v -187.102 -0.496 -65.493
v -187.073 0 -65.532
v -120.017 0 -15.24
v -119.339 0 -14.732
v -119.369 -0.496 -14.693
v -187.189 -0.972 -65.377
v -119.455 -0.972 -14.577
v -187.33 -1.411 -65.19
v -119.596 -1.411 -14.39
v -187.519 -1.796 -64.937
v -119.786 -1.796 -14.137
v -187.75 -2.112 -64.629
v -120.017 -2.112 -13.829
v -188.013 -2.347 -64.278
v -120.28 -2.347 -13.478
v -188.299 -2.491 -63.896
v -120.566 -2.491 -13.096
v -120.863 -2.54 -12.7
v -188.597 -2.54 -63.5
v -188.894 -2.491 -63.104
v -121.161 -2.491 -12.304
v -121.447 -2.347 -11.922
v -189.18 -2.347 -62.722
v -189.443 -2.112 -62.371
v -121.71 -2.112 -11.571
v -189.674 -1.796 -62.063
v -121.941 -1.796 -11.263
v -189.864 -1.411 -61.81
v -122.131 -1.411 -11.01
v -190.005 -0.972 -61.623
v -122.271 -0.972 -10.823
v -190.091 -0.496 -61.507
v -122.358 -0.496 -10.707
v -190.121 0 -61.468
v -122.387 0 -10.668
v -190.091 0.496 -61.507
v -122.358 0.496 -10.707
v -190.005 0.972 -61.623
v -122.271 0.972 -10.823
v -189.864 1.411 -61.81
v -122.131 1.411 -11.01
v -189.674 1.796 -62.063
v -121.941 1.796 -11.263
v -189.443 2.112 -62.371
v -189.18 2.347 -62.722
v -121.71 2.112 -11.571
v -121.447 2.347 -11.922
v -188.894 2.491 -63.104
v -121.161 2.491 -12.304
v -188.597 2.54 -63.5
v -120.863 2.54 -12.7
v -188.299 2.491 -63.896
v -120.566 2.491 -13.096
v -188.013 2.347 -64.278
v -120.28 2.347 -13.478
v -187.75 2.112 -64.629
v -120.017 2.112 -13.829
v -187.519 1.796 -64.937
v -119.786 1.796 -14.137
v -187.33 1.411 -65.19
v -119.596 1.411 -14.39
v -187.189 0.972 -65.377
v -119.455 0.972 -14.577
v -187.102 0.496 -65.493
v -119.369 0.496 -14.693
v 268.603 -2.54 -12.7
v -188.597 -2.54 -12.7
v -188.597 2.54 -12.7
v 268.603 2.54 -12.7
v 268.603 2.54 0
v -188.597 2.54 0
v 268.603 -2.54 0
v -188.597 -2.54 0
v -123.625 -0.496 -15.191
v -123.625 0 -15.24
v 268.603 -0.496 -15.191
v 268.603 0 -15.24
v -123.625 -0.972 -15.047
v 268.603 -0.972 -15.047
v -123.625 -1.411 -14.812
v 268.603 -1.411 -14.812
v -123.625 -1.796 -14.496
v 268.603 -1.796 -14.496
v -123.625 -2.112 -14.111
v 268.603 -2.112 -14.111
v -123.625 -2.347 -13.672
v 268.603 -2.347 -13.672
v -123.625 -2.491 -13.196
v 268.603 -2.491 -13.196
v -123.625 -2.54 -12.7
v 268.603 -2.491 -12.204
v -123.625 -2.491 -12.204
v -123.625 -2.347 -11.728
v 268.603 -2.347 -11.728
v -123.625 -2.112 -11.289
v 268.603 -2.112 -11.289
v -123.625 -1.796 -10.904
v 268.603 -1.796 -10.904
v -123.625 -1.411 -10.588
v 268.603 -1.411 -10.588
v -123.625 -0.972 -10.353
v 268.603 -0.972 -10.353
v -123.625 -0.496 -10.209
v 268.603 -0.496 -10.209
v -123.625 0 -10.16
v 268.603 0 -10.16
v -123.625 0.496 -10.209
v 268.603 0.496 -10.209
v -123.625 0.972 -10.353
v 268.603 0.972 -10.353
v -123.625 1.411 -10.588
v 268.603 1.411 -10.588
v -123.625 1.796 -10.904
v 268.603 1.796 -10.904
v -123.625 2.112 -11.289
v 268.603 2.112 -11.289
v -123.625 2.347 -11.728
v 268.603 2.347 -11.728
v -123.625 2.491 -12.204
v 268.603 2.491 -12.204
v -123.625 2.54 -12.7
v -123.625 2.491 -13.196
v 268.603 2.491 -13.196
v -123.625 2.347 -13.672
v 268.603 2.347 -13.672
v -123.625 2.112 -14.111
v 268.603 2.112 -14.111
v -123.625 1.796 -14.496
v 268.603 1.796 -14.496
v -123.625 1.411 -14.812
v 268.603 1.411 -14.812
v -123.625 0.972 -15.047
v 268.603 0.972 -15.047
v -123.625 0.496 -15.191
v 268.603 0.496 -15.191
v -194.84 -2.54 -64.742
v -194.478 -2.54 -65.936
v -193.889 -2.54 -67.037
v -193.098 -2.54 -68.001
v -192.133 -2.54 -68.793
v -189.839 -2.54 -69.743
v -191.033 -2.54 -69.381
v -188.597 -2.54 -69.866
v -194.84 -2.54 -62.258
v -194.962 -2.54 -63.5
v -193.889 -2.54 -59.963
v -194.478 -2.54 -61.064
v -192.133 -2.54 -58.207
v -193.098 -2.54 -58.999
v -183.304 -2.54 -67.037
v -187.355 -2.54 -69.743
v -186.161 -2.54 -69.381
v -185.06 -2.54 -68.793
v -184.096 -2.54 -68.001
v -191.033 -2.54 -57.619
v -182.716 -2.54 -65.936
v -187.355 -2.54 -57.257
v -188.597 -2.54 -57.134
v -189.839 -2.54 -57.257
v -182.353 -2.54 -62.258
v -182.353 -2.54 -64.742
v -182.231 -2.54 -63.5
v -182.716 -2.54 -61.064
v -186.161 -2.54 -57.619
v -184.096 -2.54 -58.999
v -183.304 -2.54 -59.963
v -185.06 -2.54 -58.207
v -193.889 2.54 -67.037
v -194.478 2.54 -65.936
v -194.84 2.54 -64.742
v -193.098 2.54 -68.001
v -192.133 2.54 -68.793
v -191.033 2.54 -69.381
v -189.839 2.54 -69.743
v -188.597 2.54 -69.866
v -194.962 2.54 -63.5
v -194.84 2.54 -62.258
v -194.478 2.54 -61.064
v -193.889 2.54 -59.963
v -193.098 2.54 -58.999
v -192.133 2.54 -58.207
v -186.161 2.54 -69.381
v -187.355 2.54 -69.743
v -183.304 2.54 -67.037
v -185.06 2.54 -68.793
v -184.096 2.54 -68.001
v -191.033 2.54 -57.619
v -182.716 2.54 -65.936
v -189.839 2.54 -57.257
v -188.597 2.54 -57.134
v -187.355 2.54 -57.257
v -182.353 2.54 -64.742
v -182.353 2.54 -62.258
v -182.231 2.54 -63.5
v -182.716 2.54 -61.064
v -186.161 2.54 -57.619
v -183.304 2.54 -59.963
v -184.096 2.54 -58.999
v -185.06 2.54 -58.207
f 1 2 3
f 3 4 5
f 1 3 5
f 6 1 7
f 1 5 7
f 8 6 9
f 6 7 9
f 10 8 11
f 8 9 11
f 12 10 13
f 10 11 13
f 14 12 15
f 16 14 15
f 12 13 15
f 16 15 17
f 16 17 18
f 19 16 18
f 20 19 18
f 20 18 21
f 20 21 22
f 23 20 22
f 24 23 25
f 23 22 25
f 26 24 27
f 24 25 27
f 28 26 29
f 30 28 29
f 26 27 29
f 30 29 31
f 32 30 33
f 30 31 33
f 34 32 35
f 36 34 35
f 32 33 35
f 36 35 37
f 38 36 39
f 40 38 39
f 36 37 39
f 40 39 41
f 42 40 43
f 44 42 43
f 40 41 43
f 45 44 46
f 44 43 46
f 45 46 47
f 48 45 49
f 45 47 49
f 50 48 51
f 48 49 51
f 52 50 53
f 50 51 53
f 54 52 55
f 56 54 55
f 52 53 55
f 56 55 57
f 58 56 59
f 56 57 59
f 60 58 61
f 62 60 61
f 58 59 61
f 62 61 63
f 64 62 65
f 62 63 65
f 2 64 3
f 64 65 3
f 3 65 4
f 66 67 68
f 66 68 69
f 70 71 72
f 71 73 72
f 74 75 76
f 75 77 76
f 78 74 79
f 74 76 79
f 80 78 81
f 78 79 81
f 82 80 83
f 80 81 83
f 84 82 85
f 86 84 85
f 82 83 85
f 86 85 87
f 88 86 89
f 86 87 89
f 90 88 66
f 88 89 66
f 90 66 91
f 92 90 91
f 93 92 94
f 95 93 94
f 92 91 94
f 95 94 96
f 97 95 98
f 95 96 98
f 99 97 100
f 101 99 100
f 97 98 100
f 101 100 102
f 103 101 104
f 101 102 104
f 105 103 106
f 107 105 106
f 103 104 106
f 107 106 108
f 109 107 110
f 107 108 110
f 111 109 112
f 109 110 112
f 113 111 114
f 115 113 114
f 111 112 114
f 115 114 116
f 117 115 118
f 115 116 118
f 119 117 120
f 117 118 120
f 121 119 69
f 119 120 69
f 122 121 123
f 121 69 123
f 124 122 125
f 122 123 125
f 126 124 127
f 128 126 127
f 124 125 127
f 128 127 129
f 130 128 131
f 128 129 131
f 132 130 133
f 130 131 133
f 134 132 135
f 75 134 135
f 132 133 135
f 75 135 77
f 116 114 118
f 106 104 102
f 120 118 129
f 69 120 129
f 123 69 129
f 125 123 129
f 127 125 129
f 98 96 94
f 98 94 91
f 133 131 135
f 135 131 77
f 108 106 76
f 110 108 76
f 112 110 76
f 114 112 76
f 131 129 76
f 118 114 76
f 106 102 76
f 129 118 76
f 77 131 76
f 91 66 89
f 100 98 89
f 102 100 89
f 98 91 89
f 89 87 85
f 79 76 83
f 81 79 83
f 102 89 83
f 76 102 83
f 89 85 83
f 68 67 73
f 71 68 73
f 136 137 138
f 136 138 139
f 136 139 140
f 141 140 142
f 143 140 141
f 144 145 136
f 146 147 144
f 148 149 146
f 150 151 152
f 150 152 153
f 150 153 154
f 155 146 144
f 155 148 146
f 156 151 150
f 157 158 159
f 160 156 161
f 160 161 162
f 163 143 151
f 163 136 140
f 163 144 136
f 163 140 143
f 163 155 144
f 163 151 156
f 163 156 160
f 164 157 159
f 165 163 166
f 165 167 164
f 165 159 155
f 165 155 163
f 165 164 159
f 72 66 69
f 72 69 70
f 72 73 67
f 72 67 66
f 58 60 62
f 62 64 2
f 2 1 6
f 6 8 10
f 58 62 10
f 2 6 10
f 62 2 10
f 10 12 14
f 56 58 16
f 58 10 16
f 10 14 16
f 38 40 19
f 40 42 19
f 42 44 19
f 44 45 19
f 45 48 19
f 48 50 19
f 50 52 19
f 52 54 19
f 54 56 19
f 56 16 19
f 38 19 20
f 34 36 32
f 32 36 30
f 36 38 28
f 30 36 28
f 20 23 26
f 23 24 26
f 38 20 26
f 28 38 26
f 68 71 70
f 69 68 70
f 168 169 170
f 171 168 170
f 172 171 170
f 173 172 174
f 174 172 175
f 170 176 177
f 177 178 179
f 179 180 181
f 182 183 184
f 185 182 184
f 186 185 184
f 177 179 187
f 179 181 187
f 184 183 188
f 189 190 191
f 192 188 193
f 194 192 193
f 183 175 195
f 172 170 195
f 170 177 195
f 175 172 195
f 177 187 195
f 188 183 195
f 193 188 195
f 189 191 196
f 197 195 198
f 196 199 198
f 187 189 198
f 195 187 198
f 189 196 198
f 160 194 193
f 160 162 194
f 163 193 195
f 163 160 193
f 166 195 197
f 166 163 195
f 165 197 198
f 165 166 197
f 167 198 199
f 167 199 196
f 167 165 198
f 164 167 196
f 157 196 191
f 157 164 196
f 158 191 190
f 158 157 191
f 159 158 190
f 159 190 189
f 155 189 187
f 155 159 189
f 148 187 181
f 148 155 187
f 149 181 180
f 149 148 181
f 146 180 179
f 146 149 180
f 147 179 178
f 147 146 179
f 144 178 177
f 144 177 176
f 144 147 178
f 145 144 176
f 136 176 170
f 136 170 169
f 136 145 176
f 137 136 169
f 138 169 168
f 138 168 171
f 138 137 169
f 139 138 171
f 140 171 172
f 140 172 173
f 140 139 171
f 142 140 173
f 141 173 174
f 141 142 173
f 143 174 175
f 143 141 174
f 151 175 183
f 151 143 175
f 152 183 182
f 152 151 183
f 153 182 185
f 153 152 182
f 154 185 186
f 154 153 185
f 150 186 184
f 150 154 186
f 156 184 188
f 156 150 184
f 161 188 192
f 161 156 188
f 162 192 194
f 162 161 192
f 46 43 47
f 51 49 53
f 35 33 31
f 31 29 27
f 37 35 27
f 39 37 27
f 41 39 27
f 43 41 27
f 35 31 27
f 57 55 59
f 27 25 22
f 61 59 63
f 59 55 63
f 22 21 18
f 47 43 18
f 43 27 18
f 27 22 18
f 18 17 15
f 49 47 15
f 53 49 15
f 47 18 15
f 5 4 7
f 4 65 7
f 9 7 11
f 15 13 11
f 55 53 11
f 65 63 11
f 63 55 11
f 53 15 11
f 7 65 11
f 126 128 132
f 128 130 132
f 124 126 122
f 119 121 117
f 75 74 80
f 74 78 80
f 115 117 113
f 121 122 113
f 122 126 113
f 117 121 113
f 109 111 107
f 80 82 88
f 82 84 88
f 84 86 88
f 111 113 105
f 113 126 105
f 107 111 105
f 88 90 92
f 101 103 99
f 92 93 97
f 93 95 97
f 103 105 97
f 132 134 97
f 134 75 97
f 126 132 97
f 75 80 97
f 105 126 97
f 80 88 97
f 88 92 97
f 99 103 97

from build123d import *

# Parameters (mm, degrees)
F0_W     = 457.2
F0_H     = 12.7
F1_DEPTH = 2.54
F0_R     = 6.3655376122


with BuildPart() as f1:
    # F0 (on Front) → F1 (new body, symmetric)
    with BuildSketch(Plane.XZ):
        with Locations((40.0032907919, -6.35)):
            Rectangle(F0_W, F0_H)
    extrude(amount=F1_DEPTH, both=True)


with BuildPart() as f1b:
    # F0 (on Front) → F1, piece 2 (new body, symmetric)
    with BuildSketch(Plane.XZ):
        with Locations((-188.5967092081, -63.5)):
            Circle(F0_R)
    extrude(amount=F1_DEPTH, both=True)


with BuildPart() as f3:
    # F2 (on Front) → F3 (revolve)
    with BuildSketch(Plane.XZ):
        Polygon((-119.3393925642, -14.7319998171), (-120.8633928081, -12.7), (-123.6254423857, -14.7715377011), (-123.6254423857, -15.24), (-120.0167259721, -15.24), align=None)
        Polygon((-123.6254423857, -15.24), (-123.6254423857, -14.7715377011), (-188.5967092081, -63.5), (-187.0727089642, -65.5319998171), (-120.0167259721, -15.24), align=None)
    revolve(axis=Axis((-154.7300510081, 0, -38.1), (-0.799999928, 0, -0.600000096)))


with BuildPart() as f4:
    # F2 (on Front) → F4 (revolve)
    with BuildSketch(Plane.XZ):
        Polygon((268.6032907919, -12.7), (-120.8633928081, -12.7), (-119.3393925642, -14.7319998171), (-120.0167259721, -15.24), (268.6032907919, -15.24), align=None)
        Polygon((-123.6254423857, -14.7715377011), (-120.8633928081, -12.7), (-123.6254423857, -12.7), align=None)
        Polygon((-119.3393925642, -14.7319998171), (-120.8633928081, -12.7), (-123.6254423857, -14.7715377011), (-123.6254423857, -15.24), (-120.0167259721, -15.24), align=None)
    revolve(axis=Axis((-122.2444175969, 0, -12.7), (-1, 0, 0)))


solid = Compound([f1.part, f1b.part, f3.part, f4.part])
